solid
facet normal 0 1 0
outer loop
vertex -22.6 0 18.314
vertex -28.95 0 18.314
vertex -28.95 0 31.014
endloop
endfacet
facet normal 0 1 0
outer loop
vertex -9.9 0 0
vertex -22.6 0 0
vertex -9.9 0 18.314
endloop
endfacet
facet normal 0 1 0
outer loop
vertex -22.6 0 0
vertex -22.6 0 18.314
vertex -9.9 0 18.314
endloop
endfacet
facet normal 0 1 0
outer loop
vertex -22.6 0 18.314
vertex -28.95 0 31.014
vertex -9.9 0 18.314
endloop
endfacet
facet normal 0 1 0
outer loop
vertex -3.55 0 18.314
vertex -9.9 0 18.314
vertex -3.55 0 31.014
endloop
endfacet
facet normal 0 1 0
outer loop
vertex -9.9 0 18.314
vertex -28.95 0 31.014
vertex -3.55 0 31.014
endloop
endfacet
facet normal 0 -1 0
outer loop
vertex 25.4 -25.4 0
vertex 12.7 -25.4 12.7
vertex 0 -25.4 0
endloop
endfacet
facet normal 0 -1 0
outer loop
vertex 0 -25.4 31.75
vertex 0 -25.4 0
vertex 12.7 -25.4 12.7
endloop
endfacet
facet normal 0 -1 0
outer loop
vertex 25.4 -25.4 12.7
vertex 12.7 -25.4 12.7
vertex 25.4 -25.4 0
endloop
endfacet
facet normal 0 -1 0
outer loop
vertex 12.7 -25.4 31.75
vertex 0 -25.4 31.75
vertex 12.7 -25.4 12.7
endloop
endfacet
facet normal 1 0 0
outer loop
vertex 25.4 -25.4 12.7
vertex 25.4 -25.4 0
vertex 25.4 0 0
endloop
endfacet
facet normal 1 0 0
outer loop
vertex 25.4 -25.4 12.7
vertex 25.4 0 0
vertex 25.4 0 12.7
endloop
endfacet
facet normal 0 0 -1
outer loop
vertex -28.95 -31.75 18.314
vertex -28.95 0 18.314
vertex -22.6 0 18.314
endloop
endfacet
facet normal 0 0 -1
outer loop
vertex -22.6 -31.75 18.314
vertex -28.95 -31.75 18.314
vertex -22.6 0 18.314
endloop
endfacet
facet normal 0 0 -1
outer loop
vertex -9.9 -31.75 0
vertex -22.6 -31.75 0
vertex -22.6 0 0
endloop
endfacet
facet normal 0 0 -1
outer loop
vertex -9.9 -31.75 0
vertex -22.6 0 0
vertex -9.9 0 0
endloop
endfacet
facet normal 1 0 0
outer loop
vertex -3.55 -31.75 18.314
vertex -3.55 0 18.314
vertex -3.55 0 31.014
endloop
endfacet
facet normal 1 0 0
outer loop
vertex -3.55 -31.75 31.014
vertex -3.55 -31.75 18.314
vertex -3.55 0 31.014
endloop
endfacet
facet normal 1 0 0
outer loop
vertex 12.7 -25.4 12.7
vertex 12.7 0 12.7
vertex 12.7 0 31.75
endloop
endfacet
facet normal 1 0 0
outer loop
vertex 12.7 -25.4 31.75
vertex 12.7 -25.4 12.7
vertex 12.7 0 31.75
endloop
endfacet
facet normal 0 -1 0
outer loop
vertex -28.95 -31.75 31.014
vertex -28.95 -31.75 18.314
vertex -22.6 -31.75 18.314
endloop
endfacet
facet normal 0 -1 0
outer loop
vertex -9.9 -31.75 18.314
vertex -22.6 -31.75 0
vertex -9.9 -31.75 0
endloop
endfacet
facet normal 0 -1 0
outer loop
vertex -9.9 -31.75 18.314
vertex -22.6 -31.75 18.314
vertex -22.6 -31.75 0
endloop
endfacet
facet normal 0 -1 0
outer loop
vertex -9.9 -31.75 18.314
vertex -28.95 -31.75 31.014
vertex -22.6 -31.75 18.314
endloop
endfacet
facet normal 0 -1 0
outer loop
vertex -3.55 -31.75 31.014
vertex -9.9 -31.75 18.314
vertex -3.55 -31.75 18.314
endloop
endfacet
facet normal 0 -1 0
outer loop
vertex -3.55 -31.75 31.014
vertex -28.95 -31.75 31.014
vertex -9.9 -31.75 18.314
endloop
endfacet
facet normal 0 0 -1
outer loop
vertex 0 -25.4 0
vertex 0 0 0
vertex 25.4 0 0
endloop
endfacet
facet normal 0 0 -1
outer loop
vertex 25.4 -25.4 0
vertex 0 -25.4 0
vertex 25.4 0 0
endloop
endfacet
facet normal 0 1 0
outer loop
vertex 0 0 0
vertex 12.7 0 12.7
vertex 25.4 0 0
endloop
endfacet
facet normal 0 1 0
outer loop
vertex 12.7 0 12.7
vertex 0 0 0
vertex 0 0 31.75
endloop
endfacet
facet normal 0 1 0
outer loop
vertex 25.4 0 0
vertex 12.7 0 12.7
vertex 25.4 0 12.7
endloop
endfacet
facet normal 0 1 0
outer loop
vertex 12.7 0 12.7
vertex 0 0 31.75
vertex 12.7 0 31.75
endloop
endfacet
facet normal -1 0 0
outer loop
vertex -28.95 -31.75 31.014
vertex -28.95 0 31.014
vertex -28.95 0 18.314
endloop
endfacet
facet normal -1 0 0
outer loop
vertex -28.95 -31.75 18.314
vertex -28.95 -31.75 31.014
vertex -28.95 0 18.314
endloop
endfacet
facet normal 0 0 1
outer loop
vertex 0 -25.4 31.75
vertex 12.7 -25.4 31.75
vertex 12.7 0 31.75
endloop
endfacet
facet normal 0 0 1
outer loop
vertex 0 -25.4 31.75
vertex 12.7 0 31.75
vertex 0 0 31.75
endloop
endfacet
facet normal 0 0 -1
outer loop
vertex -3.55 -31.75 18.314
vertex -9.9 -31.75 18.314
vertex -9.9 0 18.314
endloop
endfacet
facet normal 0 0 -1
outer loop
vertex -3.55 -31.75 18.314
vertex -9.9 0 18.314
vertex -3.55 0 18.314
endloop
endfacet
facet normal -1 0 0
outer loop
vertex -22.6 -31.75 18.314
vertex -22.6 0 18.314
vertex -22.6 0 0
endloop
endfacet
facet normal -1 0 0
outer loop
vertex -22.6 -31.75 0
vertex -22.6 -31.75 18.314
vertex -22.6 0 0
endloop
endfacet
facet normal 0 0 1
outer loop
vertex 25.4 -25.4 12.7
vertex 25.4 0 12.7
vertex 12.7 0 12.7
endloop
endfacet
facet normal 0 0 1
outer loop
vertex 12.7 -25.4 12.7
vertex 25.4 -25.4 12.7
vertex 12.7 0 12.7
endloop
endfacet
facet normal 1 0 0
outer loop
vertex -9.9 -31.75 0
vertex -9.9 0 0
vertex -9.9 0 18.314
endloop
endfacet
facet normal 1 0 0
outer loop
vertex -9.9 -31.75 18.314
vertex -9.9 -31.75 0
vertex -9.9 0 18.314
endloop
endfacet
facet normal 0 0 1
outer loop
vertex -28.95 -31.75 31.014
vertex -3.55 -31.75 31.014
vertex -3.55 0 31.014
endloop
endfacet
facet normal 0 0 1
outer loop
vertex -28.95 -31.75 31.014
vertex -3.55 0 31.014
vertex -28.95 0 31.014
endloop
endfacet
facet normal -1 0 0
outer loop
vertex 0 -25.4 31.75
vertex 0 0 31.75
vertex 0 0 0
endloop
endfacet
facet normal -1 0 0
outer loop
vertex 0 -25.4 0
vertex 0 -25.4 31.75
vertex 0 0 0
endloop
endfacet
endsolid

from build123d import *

# Parameters (mm, degrees)
F1_DEPTH = 25.4
F3_DEPTH = 31.75


# Not quite as in the source:
# - a length typed as a fraction of an inch, garbled in the dataset ("3 / 203.2 mm" for 3/8 in), is restored


with BuildPart() as f1:
    # F0 (on Front) → F1 (new body)
    with BuildSketch(Plane.XZ):
        Polygon((12.7, 31.75), (0, 31.75), (0, 0), (25.4, 0), (25.4, 12.7), (12.7, 12.7), align=None)
    extrude(amount=F1_DEPTH)


with BuildPart() as f3:
    # F2 (on Front) → F3 (new body)
    with BuildSketch(Plane.XZ):
        Polygon((-22.599989511, 0), (-9.899989511, 0), (-9.899989511, 18.3144848176), (-3.549989511, 18.3144848176), (-3.549989511, 31.0144848176), (-28.949989511, 31.0144848176), (-28.949989511, 18.3144848176), (-22.599989511, 18.3144848176), align=None)
    extrude(amount=F3_DEPTH)


solid = Compound([f1.part, f3.part])
